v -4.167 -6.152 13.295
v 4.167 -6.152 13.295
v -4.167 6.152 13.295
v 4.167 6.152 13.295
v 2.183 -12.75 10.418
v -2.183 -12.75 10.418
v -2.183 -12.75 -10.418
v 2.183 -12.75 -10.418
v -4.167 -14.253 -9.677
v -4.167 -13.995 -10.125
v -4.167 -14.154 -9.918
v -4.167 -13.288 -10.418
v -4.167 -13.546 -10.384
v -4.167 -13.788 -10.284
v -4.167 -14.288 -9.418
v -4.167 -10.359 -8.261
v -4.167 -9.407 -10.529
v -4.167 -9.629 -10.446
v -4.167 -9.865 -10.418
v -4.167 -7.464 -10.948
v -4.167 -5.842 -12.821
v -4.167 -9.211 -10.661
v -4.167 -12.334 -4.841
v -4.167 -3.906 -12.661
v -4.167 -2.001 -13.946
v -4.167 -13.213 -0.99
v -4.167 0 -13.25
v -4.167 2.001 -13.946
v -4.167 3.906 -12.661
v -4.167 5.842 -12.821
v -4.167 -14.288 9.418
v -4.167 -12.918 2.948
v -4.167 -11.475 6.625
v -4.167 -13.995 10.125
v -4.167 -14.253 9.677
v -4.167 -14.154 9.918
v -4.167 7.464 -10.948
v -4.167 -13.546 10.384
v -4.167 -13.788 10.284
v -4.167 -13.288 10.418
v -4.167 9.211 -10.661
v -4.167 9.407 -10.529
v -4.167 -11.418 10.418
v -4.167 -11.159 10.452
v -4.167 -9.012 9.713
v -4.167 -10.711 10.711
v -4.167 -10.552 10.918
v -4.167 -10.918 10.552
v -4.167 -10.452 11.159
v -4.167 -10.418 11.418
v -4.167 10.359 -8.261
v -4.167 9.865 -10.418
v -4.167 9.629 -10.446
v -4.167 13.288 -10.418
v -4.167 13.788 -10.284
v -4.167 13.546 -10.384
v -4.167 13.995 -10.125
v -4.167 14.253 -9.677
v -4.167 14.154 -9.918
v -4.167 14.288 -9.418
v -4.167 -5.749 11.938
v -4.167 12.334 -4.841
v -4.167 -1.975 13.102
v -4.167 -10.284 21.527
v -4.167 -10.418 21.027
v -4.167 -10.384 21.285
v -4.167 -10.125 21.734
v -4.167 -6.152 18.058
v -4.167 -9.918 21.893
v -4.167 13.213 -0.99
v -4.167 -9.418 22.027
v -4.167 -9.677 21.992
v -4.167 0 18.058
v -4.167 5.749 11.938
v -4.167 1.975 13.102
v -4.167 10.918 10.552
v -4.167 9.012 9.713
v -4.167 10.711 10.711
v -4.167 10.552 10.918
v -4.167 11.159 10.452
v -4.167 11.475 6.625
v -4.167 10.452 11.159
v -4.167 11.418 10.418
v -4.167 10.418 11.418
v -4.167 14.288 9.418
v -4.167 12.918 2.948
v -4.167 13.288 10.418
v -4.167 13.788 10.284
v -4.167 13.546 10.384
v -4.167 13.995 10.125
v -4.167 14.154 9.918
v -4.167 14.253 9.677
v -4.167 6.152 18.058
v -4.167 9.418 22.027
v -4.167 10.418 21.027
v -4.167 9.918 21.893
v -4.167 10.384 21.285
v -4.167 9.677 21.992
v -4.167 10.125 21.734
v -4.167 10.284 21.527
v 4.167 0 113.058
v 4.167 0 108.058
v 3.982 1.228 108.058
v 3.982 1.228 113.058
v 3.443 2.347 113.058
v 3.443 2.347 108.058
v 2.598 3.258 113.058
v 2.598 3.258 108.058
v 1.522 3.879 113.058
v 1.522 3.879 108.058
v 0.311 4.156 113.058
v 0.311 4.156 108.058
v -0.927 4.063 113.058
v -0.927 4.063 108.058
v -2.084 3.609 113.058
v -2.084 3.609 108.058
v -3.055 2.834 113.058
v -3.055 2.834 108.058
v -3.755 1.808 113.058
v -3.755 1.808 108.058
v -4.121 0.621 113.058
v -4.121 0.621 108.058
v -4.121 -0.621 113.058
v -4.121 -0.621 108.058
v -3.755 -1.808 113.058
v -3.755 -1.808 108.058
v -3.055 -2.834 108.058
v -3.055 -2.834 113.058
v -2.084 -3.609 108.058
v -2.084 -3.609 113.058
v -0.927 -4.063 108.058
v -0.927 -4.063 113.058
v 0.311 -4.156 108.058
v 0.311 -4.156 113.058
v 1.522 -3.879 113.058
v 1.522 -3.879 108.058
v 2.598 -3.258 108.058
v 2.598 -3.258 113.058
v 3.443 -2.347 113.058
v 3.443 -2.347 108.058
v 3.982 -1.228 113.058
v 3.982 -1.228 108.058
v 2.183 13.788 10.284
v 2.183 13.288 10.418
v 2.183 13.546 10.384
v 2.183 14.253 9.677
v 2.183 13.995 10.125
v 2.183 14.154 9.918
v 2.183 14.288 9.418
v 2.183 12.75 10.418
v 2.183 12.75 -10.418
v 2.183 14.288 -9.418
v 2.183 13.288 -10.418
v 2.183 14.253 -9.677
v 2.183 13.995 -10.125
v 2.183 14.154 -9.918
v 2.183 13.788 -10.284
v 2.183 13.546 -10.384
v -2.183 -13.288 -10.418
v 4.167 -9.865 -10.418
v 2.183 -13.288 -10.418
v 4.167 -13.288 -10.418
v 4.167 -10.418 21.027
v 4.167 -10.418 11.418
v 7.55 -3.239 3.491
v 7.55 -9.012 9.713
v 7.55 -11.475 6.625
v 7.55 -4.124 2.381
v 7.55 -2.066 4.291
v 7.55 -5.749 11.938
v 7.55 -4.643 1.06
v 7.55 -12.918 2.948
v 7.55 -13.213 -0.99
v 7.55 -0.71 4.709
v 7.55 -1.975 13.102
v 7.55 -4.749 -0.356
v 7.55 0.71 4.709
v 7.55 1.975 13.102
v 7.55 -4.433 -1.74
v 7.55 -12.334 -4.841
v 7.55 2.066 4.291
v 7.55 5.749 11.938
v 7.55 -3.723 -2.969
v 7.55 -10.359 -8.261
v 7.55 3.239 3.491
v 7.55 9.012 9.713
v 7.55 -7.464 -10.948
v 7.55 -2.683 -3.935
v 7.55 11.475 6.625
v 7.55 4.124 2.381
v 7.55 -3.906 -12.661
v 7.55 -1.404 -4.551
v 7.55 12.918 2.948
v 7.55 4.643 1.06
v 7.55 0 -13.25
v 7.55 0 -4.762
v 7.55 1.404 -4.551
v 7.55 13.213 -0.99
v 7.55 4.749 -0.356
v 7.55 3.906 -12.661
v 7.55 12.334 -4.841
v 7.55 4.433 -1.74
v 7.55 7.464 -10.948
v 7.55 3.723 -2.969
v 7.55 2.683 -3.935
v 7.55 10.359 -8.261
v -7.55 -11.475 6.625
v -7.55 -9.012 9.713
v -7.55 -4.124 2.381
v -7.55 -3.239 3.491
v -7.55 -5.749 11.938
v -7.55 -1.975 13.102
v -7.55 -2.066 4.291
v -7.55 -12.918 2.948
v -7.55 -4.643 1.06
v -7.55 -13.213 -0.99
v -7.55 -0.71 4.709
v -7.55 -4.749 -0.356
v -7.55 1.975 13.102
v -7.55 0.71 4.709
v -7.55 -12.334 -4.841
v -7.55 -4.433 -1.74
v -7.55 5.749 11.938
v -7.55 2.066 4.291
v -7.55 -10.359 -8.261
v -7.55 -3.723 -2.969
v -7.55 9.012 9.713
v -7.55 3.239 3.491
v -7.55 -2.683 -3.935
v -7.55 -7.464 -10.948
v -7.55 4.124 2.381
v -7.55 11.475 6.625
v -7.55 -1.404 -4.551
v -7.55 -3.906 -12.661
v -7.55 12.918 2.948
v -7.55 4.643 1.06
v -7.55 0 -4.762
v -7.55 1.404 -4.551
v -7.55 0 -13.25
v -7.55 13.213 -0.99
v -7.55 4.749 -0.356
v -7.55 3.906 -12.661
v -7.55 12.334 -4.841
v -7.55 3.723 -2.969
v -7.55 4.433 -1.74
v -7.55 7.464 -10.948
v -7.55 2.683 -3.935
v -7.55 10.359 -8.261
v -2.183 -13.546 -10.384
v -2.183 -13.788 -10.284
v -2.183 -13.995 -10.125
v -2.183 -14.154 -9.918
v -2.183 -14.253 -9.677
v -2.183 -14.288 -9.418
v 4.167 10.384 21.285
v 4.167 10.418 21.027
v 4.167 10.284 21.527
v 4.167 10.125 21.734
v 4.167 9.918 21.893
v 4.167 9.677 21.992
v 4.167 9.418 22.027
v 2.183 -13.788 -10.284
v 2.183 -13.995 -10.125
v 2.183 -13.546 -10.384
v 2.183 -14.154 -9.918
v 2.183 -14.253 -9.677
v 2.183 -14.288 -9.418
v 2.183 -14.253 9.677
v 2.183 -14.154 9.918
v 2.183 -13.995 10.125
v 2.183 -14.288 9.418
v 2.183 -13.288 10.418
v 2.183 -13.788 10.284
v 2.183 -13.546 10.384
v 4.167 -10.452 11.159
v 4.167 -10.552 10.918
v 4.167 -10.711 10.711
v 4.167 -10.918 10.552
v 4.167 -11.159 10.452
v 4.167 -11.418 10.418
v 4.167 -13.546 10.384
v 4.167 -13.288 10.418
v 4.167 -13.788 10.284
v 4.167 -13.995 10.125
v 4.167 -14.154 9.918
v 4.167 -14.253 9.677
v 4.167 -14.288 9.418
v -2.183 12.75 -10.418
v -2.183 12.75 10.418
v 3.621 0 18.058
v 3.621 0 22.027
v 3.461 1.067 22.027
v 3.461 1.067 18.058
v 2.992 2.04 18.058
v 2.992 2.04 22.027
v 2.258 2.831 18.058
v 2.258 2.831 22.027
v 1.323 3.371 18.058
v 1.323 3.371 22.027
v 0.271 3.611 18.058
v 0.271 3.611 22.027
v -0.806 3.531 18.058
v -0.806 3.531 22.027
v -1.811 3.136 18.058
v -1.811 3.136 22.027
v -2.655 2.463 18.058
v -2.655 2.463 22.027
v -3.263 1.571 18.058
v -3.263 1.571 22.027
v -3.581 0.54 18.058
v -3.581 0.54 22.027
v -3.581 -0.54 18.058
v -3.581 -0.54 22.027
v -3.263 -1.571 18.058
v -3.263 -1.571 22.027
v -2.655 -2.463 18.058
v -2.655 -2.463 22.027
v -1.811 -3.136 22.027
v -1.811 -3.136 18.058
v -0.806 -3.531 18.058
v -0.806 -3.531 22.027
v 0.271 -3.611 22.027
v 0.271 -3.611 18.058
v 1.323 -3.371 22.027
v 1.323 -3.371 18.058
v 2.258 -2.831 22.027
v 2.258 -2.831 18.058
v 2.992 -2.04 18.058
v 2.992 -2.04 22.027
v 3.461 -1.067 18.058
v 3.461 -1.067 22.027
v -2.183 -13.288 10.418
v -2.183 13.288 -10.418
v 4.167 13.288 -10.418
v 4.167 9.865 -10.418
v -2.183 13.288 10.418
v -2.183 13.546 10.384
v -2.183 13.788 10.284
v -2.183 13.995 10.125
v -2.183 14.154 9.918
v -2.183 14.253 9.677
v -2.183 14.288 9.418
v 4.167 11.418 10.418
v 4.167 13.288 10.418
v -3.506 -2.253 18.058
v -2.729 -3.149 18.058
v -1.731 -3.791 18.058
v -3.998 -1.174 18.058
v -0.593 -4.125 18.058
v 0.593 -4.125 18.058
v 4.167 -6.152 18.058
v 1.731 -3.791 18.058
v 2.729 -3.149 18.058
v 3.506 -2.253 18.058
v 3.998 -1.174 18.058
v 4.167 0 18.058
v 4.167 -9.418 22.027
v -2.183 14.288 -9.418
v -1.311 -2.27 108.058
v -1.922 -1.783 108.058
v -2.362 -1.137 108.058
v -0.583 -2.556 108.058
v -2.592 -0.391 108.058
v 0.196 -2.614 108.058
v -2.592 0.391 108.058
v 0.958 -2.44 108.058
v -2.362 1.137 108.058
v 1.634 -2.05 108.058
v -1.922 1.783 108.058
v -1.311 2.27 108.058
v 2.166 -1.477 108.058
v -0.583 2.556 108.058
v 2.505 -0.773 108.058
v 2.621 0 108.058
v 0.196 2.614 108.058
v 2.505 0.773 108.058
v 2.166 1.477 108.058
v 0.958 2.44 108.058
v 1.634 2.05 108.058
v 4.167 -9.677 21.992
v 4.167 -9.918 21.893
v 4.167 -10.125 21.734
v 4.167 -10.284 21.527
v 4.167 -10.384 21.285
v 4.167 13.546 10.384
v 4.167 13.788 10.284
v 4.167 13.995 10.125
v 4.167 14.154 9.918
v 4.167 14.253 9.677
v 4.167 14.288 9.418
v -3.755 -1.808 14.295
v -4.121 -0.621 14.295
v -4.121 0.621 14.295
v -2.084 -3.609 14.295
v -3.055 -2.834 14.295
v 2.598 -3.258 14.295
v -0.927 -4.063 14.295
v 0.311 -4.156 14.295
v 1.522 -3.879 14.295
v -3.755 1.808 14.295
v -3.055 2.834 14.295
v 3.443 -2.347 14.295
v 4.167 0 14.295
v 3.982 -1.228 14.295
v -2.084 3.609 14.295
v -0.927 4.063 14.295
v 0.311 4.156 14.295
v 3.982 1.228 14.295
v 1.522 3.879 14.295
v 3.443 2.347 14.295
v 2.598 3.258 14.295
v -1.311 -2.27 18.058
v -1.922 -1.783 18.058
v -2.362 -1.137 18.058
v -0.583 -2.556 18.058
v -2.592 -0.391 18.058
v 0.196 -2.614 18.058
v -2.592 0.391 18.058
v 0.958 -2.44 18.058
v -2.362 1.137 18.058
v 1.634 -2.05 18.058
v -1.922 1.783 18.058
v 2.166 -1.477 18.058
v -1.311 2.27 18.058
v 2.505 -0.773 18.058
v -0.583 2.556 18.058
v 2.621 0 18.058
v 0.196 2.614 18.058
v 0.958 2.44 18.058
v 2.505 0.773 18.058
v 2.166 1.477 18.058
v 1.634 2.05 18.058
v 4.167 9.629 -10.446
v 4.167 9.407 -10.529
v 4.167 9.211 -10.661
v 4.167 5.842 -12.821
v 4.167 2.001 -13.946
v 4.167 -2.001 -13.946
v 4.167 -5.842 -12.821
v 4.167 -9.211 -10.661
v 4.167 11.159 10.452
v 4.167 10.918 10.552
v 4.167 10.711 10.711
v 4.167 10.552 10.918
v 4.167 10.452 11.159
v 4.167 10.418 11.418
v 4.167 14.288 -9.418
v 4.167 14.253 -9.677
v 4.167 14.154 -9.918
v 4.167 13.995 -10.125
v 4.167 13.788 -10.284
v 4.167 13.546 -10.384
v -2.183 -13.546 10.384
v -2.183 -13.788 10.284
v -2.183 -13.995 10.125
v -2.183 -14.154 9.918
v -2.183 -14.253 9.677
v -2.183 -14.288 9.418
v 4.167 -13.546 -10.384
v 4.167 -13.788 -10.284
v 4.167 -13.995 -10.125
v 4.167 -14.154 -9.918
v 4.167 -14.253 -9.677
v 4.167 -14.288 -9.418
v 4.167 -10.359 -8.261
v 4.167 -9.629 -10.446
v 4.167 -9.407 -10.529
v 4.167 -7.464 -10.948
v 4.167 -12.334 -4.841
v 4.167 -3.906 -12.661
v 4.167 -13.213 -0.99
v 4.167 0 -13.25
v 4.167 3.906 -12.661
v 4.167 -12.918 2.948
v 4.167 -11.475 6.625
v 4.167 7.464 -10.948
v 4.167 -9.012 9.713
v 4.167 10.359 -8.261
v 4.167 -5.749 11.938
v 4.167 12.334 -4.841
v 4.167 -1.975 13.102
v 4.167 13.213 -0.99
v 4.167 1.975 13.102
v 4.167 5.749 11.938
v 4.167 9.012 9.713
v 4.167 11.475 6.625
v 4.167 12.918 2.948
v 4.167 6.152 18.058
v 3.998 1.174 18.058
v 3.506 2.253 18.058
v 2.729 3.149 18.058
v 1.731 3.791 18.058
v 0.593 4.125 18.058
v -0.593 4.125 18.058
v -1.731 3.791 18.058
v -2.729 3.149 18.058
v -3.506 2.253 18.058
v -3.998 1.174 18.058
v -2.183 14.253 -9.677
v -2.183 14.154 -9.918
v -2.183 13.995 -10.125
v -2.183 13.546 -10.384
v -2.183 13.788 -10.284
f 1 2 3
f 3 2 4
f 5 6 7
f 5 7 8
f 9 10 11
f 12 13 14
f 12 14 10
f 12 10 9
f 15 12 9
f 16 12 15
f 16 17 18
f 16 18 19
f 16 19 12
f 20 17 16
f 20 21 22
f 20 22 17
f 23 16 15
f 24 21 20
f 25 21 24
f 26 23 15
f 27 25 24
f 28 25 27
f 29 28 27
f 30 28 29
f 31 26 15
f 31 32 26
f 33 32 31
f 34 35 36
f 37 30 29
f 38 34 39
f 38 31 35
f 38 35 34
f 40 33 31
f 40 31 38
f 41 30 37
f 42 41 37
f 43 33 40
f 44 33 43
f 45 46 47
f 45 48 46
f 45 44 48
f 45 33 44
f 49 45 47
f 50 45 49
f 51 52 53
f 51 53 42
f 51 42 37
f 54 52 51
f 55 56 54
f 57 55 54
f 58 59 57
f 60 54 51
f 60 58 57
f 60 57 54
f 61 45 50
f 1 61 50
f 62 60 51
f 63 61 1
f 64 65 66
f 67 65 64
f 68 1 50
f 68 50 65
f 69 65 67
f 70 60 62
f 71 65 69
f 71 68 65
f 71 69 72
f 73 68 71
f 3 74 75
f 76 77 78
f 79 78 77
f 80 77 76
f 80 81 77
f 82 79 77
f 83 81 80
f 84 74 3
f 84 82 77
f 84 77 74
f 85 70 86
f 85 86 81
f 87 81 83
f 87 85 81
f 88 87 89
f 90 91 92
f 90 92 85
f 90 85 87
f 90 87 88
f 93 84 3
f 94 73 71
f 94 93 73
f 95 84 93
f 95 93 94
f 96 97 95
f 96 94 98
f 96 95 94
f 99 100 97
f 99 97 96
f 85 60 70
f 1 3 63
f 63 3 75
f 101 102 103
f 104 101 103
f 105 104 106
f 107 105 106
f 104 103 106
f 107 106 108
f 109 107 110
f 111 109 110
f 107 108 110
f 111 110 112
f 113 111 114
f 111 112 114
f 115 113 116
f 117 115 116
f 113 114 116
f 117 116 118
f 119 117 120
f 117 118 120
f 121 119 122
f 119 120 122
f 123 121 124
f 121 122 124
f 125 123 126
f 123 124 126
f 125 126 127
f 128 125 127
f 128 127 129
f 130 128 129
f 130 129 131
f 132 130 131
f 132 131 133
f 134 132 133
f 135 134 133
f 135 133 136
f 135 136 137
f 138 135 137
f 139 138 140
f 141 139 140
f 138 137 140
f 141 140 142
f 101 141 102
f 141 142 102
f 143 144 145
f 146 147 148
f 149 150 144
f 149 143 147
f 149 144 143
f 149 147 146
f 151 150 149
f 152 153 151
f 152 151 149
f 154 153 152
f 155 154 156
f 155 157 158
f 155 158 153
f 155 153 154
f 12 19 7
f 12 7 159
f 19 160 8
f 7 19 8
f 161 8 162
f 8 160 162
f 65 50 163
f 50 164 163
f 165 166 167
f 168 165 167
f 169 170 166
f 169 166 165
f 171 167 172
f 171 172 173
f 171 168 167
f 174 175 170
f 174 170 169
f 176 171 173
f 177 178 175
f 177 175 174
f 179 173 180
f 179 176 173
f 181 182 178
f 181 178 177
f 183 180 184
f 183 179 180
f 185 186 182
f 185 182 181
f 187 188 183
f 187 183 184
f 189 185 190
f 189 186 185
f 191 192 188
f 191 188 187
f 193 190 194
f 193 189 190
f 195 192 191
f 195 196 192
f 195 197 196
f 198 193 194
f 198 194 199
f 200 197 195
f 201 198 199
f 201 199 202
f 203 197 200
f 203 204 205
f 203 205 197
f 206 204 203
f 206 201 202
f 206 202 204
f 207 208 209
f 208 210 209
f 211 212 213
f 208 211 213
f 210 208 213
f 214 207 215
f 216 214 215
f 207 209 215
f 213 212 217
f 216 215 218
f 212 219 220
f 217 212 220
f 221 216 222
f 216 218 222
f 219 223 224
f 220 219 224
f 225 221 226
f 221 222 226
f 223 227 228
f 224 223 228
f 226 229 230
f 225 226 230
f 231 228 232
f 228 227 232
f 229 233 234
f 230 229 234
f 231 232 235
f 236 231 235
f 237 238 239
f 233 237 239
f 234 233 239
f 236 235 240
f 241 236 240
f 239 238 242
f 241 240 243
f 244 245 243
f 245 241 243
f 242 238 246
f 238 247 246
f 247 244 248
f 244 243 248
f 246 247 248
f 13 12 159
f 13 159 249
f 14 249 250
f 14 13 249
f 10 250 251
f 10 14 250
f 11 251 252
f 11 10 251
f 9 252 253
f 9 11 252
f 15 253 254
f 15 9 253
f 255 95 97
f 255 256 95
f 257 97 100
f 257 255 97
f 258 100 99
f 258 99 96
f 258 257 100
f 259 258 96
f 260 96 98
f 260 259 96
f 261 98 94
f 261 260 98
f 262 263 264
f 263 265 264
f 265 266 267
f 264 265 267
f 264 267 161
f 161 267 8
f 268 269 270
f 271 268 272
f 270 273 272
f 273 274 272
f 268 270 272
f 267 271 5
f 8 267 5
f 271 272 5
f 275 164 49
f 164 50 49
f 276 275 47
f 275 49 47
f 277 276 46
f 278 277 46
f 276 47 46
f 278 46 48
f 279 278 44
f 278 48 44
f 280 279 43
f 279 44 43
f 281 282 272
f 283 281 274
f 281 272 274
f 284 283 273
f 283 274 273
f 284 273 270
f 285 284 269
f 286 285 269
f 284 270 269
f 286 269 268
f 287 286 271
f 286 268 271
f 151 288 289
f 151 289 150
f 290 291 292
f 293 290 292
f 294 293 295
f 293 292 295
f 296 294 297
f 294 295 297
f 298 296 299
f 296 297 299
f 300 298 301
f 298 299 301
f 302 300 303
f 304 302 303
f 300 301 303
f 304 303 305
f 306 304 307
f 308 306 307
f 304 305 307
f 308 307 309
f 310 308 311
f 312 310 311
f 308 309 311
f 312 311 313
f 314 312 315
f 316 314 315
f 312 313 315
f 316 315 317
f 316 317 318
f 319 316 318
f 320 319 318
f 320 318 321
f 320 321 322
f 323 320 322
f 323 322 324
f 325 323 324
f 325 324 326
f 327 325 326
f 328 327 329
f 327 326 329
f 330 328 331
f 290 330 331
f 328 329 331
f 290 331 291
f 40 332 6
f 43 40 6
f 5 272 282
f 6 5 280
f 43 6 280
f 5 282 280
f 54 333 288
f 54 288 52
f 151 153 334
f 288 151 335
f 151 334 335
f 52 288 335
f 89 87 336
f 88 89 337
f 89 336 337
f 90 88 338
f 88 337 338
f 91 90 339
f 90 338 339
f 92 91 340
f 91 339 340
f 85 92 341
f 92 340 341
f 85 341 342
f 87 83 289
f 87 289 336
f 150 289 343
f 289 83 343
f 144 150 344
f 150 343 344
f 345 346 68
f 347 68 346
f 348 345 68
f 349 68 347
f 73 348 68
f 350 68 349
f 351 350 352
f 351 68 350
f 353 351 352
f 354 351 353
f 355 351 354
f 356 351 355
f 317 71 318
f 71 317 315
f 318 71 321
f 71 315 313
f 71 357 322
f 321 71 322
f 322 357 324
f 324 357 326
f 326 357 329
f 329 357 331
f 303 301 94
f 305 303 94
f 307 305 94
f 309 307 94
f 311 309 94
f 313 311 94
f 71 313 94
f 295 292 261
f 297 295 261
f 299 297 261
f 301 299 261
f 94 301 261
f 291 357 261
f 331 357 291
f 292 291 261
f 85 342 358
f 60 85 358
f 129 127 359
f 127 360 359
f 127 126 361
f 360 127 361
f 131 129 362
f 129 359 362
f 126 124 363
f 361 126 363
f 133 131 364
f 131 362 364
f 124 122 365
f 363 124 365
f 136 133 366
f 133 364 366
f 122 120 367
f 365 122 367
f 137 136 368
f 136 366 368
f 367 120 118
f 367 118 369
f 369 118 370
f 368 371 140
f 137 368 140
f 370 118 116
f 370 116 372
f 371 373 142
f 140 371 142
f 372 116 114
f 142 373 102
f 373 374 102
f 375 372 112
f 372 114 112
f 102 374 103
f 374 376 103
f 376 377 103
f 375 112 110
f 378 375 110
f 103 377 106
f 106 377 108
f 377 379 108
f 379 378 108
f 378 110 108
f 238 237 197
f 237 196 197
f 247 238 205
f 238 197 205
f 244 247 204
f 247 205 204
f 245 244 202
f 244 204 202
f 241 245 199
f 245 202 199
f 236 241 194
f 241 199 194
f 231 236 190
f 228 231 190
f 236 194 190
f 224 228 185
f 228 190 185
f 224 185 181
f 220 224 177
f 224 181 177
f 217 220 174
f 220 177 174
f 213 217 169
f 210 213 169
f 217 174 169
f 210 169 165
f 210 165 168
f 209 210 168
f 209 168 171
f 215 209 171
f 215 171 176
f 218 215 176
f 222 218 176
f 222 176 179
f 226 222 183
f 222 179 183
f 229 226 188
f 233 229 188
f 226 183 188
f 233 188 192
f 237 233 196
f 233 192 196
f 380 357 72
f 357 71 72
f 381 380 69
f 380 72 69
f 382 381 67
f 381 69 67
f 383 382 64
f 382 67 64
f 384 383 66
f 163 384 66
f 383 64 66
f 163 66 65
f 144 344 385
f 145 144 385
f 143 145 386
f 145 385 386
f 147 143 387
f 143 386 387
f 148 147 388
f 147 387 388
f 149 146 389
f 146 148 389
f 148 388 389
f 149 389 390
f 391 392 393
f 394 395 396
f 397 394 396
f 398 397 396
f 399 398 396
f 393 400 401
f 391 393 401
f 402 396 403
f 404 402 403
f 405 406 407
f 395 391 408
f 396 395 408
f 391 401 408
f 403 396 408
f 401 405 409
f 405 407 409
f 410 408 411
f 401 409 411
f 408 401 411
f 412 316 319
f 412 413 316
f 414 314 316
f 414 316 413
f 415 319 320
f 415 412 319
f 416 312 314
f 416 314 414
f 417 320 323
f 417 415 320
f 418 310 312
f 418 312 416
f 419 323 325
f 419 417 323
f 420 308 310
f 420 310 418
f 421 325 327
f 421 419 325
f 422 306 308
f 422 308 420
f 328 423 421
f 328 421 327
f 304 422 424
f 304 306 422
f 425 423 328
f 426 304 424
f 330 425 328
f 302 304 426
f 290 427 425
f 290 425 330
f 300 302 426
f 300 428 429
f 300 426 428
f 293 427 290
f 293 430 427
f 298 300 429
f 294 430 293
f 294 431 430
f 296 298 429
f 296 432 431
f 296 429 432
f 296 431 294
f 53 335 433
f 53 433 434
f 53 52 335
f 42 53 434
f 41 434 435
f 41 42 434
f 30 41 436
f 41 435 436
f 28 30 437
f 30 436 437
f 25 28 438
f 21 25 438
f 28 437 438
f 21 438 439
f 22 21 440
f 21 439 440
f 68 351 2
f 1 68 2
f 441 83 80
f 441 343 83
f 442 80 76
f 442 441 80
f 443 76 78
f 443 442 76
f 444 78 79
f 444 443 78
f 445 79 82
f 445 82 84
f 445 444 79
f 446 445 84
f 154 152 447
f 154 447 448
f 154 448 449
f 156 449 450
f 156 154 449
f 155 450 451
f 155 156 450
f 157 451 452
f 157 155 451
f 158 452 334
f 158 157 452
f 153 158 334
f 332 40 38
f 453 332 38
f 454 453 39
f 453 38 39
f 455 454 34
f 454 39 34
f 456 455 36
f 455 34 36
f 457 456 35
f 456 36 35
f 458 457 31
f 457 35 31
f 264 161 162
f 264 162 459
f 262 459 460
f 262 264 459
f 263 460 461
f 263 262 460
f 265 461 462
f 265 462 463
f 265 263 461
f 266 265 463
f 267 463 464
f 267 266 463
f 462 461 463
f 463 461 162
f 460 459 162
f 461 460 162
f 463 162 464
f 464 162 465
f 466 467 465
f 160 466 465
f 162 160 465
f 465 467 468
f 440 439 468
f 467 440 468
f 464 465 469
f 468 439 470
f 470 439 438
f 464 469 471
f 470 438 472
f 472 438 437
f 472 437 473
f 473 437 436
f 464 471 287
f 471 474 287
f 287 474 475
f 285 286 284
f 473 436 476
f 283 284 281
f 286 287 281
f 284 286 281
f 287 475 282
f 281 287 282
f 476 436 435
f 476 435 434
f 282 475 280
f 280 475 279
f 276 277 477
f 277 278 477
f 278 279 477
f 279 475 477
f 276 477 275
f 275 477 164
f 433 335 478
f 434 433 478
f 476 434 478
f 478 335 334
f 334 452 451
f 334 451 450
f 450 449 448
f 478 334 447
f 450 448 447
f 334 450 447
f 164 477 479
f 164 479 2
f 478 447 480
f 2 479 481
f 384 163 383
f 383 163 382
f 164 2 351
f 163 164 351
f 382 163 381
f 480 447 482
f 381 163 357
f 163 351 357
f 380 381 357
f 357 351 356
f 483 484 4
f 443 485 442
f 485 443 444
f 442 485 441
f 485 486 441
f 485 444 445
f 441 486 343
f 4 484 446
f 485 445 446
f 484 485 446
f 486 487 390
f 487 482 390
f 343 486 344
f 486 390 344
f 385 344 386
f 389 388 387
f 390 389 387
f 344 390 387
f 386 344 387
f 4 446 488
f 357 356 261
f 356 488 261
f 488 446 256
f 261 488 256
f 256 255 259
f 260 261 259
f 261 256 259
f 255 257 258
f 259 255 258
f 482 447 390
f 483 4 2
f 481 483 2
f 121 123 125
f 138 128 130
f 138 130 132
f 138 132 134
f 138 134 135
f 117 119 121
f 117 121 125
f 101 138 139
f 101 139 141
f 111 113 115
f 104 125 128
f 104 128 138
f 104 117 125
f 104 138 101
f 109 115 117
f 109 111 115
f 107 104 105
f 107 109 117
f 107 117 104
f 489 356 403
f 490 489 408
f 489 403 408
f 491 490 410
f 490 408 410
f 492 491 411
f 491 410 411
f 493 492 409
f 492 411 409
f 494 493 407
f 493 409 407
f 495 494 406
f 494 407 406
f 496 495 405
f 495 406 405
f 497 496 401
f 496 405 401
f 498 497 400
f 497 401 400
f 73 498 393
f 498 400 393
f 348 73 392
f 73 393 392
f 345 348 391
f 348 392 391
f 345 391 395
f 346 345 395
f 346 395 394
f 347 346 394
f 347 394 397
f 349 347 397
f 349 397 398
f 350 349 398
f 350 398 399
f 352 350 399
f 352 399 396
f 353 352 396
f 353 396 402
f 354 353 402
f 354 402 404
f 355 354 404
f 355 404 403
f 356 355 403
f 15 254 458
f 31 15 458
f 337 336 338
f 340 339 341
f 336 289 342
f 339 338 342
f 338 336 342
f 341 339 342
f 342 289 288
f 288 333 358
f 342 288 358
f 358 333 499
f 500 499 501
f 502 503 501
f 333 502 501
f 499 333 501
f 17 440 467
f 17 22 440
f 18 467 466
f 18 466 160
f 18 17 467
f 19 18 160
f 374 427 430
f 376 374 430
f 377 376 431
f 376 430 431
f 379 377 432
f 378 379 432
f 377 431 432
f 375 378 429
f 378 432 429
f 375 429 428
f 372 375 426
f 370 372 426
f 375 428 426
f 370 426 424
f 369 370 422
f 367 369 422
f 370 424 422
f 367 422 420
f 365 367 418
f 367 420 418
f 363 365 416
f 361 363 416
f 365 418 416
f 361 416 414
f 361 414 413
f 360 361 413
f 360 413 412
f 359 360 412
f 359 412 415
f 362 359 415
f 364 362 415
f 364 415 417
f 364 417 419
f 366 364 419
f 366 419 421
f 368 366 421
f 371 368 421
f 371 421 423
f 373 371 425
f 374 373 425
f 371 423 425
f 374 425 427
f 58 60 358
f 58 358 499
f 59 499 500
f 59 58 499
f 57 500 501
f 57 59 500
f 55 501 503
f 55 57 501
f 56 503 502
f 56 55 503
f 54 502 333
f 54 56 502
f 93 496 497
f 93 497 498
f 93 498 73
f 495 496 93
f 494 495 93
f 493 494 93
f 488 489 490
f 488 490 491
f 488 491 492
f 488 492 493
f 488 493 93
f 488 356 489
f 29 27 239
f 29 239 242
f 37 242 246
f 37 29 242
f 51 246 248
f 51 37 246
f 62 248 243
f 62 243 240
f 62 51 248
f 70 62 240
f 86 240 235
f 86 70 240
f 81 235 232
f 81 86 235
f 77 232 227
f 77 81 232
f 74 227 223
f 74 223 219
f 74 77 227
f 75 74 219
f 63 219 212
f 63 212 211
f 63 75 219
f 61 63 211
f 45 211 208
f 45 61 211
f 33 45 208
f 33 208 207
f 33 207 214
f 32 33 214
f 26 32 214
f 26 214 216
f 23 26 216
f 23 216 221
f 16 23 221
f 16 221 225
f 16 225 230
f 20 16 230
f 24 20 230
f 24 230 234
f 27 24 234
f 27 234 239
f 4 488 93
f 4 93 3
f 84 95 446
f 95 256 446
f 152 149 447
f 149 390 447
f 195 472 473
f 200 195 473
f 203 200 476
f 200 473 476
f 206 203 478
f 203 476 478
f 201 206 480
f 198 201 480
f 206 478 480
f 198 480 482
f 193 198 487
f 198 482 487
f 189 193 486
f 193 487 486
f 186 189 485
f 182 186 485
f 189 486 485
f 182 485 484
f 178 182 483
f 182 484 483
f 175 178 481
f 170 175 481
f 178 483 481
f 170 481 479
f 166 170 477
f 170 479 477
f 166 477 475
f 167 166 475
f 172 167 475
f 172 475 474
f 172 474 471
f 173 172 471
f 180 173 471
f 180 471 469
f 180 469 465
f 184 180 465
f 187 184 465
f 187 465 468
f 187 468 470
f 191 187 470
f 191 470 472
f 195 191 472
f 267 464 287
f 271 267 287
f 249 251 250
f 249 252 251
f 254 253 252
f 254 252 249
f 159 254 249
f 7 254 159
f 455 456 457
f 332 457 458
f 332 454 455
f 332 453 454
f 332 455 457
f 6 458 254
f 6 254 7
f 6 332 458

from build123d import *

# Parameters (mm, degrees)
BASE_EXTRUDE_DEPTH       = 4.1671875
SKETCH2_R                = 13.25
BOSS_EXTRUDE1_DEPTH      = 7.55
BOSS_EXTRUDE1_DEPTH_BACK = 7.55
SKETCH3_R                = 4.7625
SKETCH3_W                = 4.7625
SKETCH3_H                = 12.303125
CUT_EXTRUDE1_DEPTH       = 8.55
CUT_EXTRUDE1_DEPTH_BACK  = 8.55
SKETCH4_R                = 3.175
BOSS_EXTRUDE3_DEPTH      = 3.96875
SKETCH6_R                = 3.621484375
CUT_EXTRUDE2_DEPTH       = 3.96875
FILLET1_R                = 1
FILLET2_R                = 1
SKETCH7_W                = 4.365625
SKETCH7_H                = 1.537890625
CUT_EXTRUDE3_DEPTH       = 23.0265625
CUT_EXTRUDE3_DEPTH_BACK  = 15.0890625
BOSS_EXTRUDE4_START      = 1
SKETCH8_R                = 4.1671875
BOSS_EXTRUDE4_DEPTH      = 3.7625
SKETCH9_R                = 2.621484375
BOSS_EXTRUDE5_DEPTH      = 90
SKETCH10_R               = 4.1671875
BOSS_EXTRUDE6_DEPTH      = 5


with BuildPart() as part:
    # Sketch1 → Base-Extrude (new body, symmetric)
    with BuildSketch(Plane(origin=(0, 0, 0), x_dir=(0, 0, -1), z_dir=(1, 0, 0))):
        with BuildLine():
            Line((-10.41796875, 14.2875), (10.41796875, 14.2875))
            Line((10.41796875, 14.2875), (10.41796875, 9.485125685))
            ThreePointArc((10.41796875, 9.485125685), (14.0890625, 0), (10.41796875, -9.485125685))
            Line((10.41796875, -9.485125685), (10.41796875, -14.2875))
            Line((10.41796875, -14.2875), (-10.41796875, -14.2875))
            Line((-10.41796875, -14.2875), (-10.41796875, -10.41796875))
            Line((-10.41796875, -10.41796875), (-22.0265625, -10.41796875))
            Line((-22.0265625, -10.41796875), (-22.0265625, 10.41796875))
            Line((-22.0265625, 10.41796875), (-10.41796875, 10.41796875))
            Line((-10.41796875, 10.41796875), (-10.41796875, 14.2875))
        make_face()
    extrude(amount=BASE_EXTRUDE_DEPTH, both=True)

    # Sketch2 → Boss-Extrude1 (add, two sides)
    with BuildSketch(Plane(origin=(0, 0, 0), x_dir=(0, 0, -1), z_dir=(1, 0, 0))) as boss_extrude1_sk:
        Circle(SKETCH2_R)
    extrude(amount=BOSS_EXTRUDE1_DEPTH)
    extrude(boss_extrude1_sk.sketch, amount=-BOSS_EXTRUDE1_DEPTH_BACK)

    # Sketch3 → Cut-Extrude1 (cut, two sides)
    with BuildSketch(Plane(origin=(0, 0, 0), x_dir=(0, 0, -1), z_dir=(1, 0, 0))) as cut_extrude1_sk:
        Circle(SKETCH3_R)
        with Locations((-15.6765625, 0)):
            Rectangle(SKETCH3_W, SKETCH3_H)
    extrude(amount=CUT_EXTRUDE1_DEPTH, mode=Mode.SUBTRACT)
    extrude(cut_extrude1_sk.sketch, amount=-CUT_EXTRUDE1_DEPTH_BACK, mode=Mode.SUBTRACT)

    # Sketch4 → Boss-Extrude3 (add)
    with BuildSketch(Plane.XY.offset(22.0265625)):
        Circle(SKETCH4_R)
    extrude(amount=-BOSS_EXTRUDE3_DEPTH)

    # Sketch6 → Cut-Extrude2 (cut)
    with BuildSketch(Plane.XY.offset(22.0265625)):
        Circle(SKETCH6_R)
    extrude(amount=-CUT_EXTRUDE2_DEPTH, mode=Mode.SUBTRACT)

    # Fillet1
    fillet1_edges = [part.edges().sort_by_distance(p)[0] for p in [
        (0, 9.485125685, -10.41796875),
        (0, -9.485125685, -10.41796875),
        (0, -10.41796875, 10.41796875),
        (0, 10.41796875, 10.41796875),
    ]]
    fillet(fillet1_edges, radius=FILLET1_R)

    # Fillet2
    fillet2_edges = [part.edges().sort_by_distance(p)[0] for p in [
        (0, 14.2875, 10.41796875),
        (0, 14.2875, -10.41796875),
        (0, -14.2875, -10.41796875),
        (0, -14.2875, 10.41796875),
        (0, -10.41796875, 22.0265625),
        (0, 10.41796875, 22.0265625),
    ]]
    fillet(fillet2_edges, radius=FILLET2_R)

    # Sketch7 → Cut-Extrude3 (cut, two sides)
    with BuildSketch(Plane.XY) as cut_extrude3_sk:
        with Locations((0, 13.518554688)):
            Rectangle(SKETCH7_W, SKETCH7_H)
        with Locations((0, -13.518554688)):
            Rectangle(SKETCH7_W, SKETCH7_H)
    extrude(amount=CUT_EXTRUDE3_DEPTH, mode=Mode.SUBTRACT)
    extrude(cut_extrude3_sk.sketch, amount=-CUT_EXTRUDE3_DEPTH_BACK, mode=Mode.SUBTRACT)

    # Sketch8 → Boss-Extrude4 (add)
    with BuildSketch(Plane.XY.offset(13.2953125).offset(BOSS_EXTRUDE4_START)):
        Circle(SKETCH8_R)
    extrude(amount=BOSS_EXTRUDE4_DEPTH)

    # Sketch9 → Boss-Extrude5 (add)
    with BuildSketch(Plane.XY.offset(18.0578125)):
        Circle(SKETCH9_R)
    extrude(amount=BOSS_EXTRUDE5_DEPTH)

    # Sketch10 → Boss-Extrude6 (add)
    with BuildSketch(Plane.XY.offset(108.0578125)):
        Circle(SKETCH10_R)
    extrude(amount=BOSS_EXTRUDE6_DEPTH)


solid = part.part
